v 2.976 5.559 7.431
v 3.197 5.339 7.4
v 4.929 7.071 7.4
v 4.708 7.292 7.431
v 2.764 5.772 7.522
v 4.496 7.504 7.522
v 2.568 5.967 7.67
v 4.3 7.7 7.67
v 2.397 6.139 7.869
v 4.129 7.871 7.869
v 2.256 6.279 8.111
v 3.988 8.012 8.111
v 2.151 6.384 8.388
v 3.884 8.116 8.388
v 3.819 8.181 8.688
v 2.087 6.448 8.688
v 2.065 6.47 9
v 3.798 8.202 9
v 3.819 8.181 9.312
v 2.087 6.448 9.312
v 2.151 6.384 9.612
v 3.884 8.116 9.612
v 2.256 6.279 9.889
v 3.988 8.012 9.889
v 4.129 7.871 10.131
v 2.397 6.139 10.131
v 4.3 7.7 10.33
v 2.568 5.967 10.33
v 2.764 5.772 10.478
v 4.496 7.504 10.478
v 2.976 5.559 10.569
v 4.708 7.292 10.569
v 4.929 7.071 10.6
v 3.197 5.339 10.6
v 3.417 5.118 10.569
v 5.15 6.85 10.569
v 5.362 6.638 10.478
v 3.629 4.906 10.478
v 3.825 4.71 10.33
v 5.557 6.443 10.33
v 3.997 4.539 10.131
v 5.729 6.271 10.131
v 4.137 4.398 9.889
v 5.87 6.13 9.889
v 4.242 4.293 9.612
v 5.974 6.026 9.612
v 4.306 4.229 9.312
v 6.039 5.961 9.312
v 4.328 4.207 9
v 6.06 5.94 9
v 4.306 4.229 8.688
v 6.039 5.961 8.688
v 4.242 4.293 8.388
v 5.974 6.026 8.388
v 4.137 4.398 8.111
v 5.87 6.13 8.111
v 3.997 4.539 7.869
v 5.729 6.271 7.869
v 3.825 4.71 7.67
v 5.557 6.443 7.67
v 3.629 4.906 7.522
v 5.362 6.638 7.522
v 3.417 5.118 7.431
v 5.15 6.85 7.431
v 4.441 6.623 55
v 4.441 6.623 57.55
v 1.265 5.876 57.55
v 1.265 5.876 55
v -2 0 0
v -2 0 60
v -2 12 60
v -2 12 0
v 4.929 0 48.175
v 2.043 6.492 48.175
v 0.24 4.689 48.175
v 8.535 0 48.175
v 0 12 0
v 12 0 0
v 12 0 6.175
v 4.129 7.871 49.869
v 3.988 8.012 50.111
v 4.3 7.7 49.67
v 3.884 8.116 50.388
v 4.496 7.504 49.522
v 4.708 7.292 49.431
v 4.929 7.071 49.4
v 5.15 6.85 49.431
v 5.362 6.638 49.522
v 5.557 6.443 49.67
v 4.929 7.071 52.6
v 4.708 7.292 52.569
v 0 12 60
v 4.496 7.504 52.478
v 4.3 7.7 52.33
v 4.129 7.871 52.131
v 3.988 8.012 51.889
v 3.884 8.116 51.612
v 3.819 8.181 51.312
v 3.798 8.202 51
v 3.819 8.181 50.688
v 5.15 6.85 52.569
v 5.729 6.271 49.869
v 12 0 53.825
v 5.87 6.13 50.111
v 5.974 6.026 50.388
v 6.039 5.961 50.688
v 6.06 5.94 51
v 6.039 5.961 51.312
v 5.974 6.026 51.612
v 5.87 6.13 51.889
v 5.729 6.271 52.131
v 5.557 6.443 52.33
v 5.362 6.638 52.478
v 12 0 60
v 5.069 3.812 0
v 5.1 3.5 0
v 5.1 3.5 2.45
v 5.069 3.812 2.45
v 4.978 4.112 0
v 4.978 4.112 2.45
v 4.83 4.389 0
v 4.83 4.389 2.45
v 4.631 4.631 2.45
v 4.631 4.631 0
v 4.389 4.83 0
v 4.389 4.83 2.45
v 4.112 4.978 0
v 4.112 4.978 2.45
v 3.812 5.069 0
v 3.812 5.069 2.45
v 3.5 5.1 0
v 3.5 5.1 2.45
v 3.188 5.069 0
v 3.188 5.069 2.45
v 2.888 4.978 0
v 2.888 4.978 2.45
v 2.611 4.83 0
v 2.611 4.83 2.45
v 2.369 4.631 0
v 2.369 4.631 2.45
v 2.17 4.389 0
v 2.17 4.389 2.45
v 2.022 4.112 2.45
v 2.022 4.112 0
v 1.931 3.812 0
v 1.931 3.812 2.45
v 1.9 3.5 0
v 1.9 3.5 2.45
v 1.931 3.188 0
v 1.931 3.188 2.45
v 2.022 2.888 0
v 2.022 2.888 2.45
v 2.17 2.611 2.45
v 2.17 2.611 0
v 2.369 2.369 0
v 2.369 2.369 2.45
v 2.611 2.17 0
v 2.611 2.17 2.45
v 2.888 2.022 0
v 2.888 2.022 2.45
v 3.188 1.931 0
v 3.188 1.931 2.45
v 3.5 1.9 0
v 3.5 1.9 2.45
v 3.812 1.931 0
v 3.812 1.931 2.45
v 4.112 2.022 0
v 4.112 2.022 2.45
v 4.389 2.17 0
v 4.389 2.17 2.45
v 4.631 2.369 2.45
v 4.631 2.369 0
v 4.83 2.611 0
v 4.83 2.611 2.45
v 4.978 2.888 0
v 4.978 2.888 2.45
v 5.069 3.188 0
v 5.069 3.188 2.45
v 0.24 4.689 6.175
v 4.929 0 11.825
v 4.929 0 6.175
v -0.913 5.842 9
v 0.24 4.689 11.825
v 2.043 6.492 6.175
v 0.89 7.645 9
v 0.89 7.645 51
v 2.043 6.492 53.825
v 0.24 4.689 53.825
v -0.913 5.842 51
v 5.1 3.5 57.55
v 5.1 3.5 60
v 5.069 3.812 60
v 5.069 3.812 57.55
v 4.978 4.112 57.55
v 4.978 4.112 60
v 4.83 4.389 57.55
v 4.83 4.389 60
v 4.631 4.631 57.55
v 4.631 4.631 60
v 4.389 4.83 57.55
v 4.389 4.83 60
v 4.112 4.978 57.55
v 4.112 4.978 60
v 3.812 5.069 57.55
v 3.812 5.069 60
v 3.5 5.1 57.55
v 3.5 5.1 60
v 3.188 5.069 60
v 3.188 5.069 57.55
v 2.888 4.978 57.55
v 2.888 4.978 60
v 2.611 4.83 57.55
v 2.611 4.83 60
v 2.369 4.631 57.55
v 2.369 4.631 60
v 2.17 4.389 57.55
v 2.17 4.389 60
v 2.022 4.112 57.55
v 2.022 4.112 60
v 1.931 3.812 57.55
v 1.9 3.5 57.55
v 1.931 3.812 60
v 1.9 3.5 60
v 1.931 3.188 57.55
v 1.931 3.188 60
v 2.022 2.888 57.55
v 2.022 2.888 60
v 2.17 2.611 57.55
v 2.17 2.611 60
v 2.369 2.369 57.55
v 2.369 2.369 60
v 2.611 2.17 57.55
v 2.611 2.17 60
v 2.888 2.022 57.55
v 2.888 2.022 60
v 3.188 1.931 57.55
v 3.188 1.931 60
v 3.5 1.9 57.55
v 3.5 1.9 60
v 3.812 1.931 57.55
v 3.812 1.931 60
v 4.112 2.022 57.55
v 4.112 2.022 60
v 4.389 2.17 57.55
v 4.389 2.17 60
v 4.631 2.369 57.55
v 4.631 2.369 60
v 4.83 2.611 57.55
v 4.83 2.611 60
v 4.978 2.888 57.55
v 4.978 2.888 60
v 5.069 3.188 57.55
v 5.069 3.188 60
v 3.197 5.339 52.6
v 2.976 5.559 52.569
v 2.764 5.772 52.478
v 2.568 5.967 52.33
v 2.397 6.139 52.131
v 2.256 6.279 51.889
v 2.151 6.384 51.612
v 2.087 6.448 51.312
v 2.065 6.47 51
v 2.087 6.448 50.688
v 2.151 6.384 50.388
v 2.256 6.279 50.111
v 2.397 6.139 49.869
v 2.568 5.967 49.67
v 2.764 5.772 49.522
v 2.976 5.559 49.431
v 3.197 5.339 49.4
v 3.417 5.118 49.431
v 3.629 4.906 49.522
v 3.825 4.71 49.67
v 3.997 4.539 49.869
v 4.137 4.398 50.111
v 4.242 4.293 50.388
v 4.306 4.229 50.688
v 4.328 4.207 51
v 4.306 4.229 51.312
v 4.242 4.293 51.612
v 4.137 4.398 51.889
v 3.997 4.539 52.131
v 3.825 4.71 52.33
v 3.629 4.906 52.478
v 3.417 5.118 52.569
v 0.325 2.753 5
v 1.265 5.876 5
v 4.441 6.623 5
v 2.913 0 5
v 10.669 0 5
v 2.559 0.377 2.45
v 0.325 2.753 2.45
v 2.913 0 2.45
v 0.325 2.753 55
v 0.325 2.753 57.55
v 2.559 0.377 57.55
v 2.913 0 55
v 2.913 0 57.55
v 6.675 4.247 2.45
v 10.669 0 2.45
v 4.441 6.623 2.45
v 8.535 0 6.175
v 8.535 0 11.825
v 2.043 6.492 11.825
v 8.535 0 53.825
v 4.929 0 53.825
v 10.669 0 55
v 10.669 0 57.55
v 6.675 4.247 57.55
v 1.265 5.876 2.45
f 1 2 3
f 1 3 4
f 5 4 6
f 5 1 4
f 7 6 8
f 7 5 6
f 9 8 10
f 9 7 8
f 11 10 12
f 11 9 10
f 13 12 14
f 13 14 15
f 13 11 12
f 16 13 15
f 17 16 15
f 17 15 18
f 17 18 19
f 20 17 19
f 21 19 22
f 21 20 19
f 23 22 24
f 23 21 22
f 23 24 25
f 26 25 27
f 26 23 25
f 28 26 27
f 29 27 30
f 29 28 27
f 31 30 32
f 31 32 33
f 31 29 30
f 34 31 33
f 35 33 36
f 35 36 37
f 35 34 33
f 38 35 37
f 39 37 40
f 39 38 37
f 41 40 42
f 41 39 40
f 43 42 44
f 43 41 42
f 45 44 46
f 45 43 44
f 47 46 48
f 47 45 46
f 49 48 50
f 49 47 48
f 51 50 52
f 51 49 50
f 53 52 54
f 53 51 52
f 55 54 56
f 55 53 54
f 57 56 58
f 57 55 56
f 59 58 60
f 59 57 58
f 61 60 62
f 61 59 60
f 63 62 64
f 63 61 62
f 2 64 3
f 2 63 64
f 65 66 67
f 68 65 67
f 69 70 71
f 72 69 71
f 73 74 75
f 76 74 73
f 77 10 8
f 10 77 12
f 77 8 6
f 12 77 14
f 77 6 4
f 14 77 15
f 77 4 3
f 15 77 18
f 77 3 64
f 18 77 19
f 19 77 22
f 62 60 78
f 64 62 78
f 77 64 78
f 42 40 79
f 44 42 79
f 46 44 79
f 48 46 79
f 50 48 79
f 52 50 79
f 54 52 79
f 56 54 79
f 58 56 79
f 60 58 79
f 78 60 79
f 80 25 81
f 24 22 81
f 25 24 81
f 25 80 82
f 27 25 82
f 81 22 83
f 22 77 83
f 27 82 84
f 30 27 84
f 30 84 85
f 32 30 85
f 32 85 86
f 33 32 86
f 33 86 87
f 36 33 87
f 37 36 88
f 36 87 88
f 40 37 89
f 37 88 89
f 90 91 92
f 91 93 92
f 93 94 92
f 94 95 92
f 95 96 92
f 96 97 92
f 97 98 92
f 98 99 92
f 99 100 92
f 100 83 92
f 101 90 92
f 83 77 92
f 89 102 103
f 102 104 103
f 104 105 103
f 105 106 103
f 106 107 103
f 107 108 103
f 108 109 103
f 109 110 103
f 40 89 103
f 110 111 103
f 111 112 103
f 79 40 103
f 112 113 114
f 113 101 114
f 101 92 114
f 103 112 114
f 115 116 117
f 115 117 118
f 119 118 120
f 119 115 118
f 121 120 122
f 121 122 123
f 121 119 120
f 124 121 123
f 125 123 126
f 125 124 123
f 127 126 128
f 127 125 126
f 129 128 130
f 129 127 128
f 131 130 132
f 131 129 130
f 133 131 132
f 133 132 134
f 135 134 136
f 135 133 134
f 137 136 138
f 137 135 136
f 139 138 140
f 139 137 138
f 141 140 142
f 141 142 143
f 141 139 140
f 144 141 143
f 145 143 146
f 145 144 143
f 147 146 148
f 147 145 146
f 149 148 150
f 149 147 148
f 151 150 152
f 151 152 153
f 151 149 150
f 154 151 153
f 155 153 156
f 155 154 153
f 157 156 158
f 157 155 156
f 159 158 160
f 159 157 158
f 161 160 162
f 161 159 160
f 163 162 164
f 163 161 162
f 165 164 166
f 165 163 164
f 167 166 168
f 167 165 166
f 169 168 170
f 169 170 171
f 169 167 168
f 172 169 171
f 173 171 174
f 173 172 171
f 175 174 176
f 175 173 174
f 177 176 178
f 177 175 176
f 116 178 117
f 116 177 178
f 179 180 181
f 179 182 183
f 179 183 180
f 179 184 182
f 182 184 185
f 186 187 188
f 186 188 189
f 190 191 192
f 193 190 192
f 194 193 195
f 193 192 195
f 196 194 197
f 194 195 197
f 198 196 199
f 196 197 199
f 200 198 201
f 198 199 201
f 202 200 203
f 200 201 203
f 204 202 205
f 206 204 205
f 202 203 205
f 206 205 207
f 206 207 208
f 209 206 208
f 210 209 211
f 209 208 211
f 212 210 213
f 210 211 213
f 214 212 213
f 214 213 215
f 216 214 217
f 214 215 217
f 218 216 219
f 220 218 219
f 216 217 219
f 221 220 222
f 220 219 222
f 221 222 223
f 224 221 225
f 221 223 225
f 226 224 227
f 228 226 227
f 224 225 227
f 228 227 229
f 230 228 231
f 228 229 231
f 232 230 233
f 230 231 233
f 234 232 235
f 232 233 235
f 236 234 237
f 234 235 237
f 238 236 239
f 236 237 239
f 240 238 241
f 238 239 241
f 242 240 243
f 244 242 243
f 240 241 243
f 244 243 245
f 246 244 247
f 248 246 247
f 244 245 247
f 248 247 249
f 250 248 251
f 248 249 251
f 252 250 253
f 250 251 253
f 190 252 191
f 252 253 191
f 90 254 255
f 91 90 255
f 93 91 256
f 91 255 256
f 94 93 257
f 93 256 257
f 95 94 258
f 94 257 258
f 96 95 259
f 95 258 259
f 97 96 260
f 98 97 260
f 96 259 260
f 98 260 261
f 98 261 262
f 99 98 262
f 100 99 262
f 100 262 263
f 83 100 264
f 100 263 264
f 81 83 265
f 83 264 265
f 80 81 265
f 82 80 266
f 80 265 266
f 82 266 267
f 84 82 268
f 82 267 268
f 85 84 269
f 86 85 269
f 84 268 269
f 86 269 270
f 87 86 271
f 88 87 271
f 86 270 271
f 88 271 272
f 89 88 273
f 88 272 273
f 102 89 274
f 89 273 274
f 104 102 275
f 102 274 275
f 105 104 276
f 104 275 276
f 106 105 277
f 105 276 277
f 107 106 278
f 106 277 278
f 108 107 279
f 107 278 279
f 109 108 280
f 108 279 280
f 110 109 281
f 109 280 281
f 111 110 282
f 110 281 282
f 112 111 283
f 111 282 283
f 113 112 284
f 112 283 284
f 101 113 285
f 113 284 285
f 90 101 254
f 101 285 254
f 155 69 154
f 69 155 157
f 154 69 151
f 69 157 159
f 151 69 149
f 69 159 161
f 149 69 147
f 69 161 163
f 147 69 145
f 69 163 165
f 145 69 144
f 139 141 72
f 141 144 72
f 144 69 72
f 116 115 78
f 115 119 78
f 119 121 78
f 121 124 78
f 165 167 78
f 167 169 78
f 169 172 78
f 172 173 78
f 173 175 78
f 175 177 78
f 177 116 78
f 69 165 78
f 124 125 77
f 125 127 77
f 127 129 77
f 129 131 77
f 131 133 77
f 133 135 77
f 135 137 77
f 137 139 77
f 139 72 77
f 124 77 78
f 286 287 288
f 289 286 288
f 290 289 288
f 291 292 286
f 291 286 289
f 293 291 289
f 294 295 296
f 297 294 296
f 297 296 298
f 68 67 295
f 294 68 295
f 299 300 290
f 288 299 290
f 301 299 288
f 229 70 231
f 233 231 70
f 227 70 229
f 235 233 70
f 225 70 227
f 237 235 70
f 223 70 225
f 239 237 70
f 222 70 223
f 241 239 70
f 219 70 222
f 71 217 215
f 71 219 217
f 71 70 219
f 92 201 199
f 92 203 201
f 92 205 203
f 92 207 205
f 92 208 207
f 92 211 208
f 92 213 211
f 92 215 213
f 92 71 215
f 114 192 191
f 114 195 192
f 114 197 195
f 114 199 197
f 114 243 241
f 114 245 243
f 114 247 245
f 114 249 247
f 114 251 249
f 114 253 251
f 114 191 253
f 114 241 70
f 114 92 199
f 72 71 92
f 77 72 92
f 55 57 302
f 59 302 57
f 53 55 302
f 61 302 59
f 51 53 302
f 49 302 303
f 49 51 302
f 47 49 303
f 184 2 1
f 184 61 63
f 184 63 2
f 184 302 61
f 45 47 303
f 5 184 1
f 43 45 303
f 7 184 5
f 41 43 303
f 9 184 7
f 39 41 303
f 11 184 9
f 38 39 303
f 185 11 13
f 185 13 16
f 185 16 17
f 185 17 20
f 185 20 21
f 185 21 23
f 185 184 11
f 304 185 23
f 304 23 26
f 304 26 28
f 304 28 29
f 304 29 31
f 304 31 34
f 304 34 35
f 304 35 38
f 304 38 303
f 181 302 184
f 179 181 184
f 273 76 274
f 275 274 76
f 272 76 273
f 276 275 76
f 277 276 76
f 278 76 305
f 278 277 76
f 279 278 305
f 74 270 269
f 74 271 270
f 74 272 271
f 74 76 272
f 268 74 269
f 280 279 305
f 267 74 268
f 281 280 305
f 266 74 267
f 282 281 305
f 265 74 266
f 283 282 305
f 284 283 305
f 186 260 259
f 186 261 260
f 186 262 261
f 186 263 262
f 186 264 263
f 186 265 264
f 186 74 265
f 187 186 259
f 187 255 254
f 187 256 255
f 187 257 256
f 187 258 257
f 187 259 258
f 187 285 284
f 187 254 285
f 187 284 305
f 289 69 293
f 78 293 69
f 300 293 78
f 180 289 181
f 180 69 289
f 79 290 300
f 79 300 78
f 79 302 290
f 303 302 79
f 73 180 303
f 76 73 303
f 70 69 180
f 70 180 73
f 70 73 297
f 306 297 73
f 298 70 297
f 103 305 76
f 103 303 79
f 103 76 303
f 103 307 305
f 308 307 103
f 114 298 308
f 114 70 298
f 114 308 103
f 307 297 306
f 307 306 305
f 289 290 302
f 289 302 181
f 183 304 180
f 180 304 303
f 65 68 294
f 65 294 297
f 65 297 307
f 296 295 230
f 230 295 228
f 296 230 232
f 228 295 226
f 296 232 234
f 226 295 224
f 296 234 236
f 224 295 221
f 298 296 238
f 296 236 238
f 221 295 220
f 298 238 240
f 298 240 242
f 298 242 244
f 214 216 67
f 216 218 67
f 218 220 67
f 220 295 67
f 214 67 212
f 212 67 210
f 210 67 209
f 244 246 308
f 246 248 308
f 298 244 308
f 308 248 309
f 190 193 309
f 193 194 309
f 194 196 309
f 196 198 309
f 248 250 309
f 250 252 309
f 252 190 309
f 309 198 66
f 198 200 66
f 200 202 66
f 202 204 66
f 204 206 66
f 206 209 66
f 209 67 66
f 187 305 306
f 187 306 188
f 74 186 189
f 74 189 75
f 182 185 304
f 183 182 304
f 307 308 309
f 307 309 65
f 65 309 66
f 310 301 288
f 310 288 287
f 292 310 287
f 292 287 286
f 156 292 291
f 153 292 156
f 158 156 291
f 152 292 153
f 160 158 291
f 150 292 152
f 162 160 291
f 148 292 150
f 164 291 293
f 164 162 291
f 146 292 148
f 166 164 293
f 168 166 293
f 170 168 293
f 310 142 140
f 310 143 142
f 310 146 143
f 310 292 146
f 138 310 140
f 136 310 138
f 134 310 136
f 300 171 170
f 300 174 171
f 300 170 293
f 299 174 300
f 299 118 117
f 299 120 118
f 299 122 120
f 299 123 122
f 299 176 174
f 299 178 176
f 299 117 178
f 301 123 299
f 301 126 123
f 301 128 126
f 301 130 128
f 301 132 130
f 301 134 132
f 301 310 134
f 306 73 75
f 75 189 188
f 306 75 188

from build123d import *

# Parameters (mm, degrees)
BOSS_EXTRUDE1_DEPTH     = 30
SKETCH1_13_W            = 2
SKETCH1_13_H            = 12
BOSS_EXTRUDE6_DEPTH     = 30
CUT_EXTRUDE3_DEPTH      = 5
BOSS_EXTRUDE4_START     = -2.45
BOSS_EXTRUDE4_OUTLINE_W = 30
BOSS_EXTRUDE4_OUTLINE_H = 14.485281374
BOSS_EXTRUDE4_OUTLINE_R = 1.6
BOSS_EXTRUDE4_DEPTH     = 2.45
CUT_EXTRUDE1_DEPTH      = 5
SKETCH1_10_R            = 1.6
BOSS_EXTRUDE5_DEPTH     = 2.45
CUT_EXTRUDE4_DEPTH      = 63.353829072


# Read off the part's stored shape, not the designer's step: Boss-Extrude4
with BuildPart() as part:
    # Sketch1 → Boss-Extrude1 (new body)
    with BuildSketch(Plane.XY):
        Polygon((0, 12), (12, 0), (0, 0), align=None)
    boss_extrude1 = extrude(amount=BOSS_EXTRUDE1_DEPTH)

    # Sketch1<13> → Boss-Extrude6 (add)
    with BuildSketch(Plane.XY):
        with Locations((-1, 6)):
            Rectangle(SKETCH1_13_W, SKETCH1_13_H)
    boss_extrude6 = extrude(amount=BOSS_EXTRUDE6_DEPTH)

    # Sketch4 → Cut-Extrude3 (cut)
    with BuildSketch(Plane(origin=(6, 6, 0), x_dir=(0, 0, -1), z_dir=(0.7071067811865477, 0.7071067811865475, 0))):
        Polygon((-6.175, -8.485281374), (-6.175, 3.145733136), (-9, 4.776747647), (-11.825, 3.145733136), (-11.825, -8.485281374), align=None)
    cut_extrude3 = extrude(amount=-CUT_EXTRUDE3_DEPTH, mode=Mode.SUBTRACT)

    # Boss-Extrude4 outline → Boss-Extrude4 (add)
    with BuildSketch(Plane(origin=(6, 6, 0), x_dir=(0, 0, -1), z_dir=(0.7071067811865477, 0.7071067811865475, 0)).offset(BOSS_EXTRUDE4_START)):
        with Locations((-15, -1.242640687)):
            Rectangle(BOSS_EXTRUDE4_OUTLINE_W, BOSS_EXTRUDE4_OUTLINE_H)
        with Locations((-9, 1.514718626)):
            Circle(BOSS_EXTRUDE4_OUTLINE_R, mode=Mode.SUBTRACT)
    boss_extrude4 = extrude(amount=BOSS_EXTRUDE4_DEPTH)

    # Sketch1<4> → Cut-Extrude1 (cut)
    with BuildSketch(Plane.XY):
        Polygon((10.669337222, 0), (4.440608352, 6.623473909), (1.265296423, 5.876327682), (0.324688071, 2.752853773), (2.91347758, 0), align=None)
    cut_extrude1 = extrude(amount=CUT_EXTRUDE1_DEPTH, mode=Mode.SUBTRACT)

    # Sketch1<10> → Boss-Extrude5 (add)
    # profile 1 of 2: a face of its own
    with BuildSketch(Plane.XY):
        Polygon((2.559391648, 0.376526091), (5.734703577, 1.123672318), (6.675311929, 4.247146227), (4.440608352, 6.623473909), (1.265296423, 5.876327682), (0.324688071, 2.752853773), align=None)
        with Locations((3.5, 3.5)):
            Circle(SKETCH1_10_R, mode=Mode.SUBTRACT)
    # profile 2 of 2: a face of its own
    with BuildSketch(Plane.XY):
        Polygon((3.5, 0), (10.669337222, 0), (6.675311929, 4.247146227), (5.734703577, 1.123672318), (2.559391648, 0.376526091), (2.91347758, 0), align=None)
    boss_extrude5 = extrude(amount=BOSS_EXTRUDE5_DEPTH)

    # Mirror1: Boss-Extrude1, Boss-Extrude6, Cut-Extrude3, Boss-Extrude4, Cut-Extrude1, Boss-Extrude5 across plane
    add(boss_extrude1.mirror(Plane.XY.offset(30)))
    add(boss_extrude6.mirror(Plane.XY.offset(30)))
    add(cut_extrude3.mirror(Plane.XY.offset(30)), mode=Mode.SUBTRACT)
    add(boss_extrude4.mirror(Plane.XY.offset(30)))
    add(cut_extrude1.mirror(Plane.XY.offset(30)), mode=Mode.SUBTRACT)
    add(boss_extrude5.mirror(Plane.XY.offset(30)))

    # Sketch1<12> → Cut-Extrude4 (cut, through all)
    with BuildSketch(Plane.XY):
        Polygon((12, -3.5), (12, 0), (10.669337222, 0), (3.5, 0), (2.91347758, 0), (1.441458618, 0), (0, 0), (0, -3.5), align=None)
    extrude(amount=CUT_EXTRUDE4_DEPTH, mode=Mode.SUBTRACT)


solid = part.part
